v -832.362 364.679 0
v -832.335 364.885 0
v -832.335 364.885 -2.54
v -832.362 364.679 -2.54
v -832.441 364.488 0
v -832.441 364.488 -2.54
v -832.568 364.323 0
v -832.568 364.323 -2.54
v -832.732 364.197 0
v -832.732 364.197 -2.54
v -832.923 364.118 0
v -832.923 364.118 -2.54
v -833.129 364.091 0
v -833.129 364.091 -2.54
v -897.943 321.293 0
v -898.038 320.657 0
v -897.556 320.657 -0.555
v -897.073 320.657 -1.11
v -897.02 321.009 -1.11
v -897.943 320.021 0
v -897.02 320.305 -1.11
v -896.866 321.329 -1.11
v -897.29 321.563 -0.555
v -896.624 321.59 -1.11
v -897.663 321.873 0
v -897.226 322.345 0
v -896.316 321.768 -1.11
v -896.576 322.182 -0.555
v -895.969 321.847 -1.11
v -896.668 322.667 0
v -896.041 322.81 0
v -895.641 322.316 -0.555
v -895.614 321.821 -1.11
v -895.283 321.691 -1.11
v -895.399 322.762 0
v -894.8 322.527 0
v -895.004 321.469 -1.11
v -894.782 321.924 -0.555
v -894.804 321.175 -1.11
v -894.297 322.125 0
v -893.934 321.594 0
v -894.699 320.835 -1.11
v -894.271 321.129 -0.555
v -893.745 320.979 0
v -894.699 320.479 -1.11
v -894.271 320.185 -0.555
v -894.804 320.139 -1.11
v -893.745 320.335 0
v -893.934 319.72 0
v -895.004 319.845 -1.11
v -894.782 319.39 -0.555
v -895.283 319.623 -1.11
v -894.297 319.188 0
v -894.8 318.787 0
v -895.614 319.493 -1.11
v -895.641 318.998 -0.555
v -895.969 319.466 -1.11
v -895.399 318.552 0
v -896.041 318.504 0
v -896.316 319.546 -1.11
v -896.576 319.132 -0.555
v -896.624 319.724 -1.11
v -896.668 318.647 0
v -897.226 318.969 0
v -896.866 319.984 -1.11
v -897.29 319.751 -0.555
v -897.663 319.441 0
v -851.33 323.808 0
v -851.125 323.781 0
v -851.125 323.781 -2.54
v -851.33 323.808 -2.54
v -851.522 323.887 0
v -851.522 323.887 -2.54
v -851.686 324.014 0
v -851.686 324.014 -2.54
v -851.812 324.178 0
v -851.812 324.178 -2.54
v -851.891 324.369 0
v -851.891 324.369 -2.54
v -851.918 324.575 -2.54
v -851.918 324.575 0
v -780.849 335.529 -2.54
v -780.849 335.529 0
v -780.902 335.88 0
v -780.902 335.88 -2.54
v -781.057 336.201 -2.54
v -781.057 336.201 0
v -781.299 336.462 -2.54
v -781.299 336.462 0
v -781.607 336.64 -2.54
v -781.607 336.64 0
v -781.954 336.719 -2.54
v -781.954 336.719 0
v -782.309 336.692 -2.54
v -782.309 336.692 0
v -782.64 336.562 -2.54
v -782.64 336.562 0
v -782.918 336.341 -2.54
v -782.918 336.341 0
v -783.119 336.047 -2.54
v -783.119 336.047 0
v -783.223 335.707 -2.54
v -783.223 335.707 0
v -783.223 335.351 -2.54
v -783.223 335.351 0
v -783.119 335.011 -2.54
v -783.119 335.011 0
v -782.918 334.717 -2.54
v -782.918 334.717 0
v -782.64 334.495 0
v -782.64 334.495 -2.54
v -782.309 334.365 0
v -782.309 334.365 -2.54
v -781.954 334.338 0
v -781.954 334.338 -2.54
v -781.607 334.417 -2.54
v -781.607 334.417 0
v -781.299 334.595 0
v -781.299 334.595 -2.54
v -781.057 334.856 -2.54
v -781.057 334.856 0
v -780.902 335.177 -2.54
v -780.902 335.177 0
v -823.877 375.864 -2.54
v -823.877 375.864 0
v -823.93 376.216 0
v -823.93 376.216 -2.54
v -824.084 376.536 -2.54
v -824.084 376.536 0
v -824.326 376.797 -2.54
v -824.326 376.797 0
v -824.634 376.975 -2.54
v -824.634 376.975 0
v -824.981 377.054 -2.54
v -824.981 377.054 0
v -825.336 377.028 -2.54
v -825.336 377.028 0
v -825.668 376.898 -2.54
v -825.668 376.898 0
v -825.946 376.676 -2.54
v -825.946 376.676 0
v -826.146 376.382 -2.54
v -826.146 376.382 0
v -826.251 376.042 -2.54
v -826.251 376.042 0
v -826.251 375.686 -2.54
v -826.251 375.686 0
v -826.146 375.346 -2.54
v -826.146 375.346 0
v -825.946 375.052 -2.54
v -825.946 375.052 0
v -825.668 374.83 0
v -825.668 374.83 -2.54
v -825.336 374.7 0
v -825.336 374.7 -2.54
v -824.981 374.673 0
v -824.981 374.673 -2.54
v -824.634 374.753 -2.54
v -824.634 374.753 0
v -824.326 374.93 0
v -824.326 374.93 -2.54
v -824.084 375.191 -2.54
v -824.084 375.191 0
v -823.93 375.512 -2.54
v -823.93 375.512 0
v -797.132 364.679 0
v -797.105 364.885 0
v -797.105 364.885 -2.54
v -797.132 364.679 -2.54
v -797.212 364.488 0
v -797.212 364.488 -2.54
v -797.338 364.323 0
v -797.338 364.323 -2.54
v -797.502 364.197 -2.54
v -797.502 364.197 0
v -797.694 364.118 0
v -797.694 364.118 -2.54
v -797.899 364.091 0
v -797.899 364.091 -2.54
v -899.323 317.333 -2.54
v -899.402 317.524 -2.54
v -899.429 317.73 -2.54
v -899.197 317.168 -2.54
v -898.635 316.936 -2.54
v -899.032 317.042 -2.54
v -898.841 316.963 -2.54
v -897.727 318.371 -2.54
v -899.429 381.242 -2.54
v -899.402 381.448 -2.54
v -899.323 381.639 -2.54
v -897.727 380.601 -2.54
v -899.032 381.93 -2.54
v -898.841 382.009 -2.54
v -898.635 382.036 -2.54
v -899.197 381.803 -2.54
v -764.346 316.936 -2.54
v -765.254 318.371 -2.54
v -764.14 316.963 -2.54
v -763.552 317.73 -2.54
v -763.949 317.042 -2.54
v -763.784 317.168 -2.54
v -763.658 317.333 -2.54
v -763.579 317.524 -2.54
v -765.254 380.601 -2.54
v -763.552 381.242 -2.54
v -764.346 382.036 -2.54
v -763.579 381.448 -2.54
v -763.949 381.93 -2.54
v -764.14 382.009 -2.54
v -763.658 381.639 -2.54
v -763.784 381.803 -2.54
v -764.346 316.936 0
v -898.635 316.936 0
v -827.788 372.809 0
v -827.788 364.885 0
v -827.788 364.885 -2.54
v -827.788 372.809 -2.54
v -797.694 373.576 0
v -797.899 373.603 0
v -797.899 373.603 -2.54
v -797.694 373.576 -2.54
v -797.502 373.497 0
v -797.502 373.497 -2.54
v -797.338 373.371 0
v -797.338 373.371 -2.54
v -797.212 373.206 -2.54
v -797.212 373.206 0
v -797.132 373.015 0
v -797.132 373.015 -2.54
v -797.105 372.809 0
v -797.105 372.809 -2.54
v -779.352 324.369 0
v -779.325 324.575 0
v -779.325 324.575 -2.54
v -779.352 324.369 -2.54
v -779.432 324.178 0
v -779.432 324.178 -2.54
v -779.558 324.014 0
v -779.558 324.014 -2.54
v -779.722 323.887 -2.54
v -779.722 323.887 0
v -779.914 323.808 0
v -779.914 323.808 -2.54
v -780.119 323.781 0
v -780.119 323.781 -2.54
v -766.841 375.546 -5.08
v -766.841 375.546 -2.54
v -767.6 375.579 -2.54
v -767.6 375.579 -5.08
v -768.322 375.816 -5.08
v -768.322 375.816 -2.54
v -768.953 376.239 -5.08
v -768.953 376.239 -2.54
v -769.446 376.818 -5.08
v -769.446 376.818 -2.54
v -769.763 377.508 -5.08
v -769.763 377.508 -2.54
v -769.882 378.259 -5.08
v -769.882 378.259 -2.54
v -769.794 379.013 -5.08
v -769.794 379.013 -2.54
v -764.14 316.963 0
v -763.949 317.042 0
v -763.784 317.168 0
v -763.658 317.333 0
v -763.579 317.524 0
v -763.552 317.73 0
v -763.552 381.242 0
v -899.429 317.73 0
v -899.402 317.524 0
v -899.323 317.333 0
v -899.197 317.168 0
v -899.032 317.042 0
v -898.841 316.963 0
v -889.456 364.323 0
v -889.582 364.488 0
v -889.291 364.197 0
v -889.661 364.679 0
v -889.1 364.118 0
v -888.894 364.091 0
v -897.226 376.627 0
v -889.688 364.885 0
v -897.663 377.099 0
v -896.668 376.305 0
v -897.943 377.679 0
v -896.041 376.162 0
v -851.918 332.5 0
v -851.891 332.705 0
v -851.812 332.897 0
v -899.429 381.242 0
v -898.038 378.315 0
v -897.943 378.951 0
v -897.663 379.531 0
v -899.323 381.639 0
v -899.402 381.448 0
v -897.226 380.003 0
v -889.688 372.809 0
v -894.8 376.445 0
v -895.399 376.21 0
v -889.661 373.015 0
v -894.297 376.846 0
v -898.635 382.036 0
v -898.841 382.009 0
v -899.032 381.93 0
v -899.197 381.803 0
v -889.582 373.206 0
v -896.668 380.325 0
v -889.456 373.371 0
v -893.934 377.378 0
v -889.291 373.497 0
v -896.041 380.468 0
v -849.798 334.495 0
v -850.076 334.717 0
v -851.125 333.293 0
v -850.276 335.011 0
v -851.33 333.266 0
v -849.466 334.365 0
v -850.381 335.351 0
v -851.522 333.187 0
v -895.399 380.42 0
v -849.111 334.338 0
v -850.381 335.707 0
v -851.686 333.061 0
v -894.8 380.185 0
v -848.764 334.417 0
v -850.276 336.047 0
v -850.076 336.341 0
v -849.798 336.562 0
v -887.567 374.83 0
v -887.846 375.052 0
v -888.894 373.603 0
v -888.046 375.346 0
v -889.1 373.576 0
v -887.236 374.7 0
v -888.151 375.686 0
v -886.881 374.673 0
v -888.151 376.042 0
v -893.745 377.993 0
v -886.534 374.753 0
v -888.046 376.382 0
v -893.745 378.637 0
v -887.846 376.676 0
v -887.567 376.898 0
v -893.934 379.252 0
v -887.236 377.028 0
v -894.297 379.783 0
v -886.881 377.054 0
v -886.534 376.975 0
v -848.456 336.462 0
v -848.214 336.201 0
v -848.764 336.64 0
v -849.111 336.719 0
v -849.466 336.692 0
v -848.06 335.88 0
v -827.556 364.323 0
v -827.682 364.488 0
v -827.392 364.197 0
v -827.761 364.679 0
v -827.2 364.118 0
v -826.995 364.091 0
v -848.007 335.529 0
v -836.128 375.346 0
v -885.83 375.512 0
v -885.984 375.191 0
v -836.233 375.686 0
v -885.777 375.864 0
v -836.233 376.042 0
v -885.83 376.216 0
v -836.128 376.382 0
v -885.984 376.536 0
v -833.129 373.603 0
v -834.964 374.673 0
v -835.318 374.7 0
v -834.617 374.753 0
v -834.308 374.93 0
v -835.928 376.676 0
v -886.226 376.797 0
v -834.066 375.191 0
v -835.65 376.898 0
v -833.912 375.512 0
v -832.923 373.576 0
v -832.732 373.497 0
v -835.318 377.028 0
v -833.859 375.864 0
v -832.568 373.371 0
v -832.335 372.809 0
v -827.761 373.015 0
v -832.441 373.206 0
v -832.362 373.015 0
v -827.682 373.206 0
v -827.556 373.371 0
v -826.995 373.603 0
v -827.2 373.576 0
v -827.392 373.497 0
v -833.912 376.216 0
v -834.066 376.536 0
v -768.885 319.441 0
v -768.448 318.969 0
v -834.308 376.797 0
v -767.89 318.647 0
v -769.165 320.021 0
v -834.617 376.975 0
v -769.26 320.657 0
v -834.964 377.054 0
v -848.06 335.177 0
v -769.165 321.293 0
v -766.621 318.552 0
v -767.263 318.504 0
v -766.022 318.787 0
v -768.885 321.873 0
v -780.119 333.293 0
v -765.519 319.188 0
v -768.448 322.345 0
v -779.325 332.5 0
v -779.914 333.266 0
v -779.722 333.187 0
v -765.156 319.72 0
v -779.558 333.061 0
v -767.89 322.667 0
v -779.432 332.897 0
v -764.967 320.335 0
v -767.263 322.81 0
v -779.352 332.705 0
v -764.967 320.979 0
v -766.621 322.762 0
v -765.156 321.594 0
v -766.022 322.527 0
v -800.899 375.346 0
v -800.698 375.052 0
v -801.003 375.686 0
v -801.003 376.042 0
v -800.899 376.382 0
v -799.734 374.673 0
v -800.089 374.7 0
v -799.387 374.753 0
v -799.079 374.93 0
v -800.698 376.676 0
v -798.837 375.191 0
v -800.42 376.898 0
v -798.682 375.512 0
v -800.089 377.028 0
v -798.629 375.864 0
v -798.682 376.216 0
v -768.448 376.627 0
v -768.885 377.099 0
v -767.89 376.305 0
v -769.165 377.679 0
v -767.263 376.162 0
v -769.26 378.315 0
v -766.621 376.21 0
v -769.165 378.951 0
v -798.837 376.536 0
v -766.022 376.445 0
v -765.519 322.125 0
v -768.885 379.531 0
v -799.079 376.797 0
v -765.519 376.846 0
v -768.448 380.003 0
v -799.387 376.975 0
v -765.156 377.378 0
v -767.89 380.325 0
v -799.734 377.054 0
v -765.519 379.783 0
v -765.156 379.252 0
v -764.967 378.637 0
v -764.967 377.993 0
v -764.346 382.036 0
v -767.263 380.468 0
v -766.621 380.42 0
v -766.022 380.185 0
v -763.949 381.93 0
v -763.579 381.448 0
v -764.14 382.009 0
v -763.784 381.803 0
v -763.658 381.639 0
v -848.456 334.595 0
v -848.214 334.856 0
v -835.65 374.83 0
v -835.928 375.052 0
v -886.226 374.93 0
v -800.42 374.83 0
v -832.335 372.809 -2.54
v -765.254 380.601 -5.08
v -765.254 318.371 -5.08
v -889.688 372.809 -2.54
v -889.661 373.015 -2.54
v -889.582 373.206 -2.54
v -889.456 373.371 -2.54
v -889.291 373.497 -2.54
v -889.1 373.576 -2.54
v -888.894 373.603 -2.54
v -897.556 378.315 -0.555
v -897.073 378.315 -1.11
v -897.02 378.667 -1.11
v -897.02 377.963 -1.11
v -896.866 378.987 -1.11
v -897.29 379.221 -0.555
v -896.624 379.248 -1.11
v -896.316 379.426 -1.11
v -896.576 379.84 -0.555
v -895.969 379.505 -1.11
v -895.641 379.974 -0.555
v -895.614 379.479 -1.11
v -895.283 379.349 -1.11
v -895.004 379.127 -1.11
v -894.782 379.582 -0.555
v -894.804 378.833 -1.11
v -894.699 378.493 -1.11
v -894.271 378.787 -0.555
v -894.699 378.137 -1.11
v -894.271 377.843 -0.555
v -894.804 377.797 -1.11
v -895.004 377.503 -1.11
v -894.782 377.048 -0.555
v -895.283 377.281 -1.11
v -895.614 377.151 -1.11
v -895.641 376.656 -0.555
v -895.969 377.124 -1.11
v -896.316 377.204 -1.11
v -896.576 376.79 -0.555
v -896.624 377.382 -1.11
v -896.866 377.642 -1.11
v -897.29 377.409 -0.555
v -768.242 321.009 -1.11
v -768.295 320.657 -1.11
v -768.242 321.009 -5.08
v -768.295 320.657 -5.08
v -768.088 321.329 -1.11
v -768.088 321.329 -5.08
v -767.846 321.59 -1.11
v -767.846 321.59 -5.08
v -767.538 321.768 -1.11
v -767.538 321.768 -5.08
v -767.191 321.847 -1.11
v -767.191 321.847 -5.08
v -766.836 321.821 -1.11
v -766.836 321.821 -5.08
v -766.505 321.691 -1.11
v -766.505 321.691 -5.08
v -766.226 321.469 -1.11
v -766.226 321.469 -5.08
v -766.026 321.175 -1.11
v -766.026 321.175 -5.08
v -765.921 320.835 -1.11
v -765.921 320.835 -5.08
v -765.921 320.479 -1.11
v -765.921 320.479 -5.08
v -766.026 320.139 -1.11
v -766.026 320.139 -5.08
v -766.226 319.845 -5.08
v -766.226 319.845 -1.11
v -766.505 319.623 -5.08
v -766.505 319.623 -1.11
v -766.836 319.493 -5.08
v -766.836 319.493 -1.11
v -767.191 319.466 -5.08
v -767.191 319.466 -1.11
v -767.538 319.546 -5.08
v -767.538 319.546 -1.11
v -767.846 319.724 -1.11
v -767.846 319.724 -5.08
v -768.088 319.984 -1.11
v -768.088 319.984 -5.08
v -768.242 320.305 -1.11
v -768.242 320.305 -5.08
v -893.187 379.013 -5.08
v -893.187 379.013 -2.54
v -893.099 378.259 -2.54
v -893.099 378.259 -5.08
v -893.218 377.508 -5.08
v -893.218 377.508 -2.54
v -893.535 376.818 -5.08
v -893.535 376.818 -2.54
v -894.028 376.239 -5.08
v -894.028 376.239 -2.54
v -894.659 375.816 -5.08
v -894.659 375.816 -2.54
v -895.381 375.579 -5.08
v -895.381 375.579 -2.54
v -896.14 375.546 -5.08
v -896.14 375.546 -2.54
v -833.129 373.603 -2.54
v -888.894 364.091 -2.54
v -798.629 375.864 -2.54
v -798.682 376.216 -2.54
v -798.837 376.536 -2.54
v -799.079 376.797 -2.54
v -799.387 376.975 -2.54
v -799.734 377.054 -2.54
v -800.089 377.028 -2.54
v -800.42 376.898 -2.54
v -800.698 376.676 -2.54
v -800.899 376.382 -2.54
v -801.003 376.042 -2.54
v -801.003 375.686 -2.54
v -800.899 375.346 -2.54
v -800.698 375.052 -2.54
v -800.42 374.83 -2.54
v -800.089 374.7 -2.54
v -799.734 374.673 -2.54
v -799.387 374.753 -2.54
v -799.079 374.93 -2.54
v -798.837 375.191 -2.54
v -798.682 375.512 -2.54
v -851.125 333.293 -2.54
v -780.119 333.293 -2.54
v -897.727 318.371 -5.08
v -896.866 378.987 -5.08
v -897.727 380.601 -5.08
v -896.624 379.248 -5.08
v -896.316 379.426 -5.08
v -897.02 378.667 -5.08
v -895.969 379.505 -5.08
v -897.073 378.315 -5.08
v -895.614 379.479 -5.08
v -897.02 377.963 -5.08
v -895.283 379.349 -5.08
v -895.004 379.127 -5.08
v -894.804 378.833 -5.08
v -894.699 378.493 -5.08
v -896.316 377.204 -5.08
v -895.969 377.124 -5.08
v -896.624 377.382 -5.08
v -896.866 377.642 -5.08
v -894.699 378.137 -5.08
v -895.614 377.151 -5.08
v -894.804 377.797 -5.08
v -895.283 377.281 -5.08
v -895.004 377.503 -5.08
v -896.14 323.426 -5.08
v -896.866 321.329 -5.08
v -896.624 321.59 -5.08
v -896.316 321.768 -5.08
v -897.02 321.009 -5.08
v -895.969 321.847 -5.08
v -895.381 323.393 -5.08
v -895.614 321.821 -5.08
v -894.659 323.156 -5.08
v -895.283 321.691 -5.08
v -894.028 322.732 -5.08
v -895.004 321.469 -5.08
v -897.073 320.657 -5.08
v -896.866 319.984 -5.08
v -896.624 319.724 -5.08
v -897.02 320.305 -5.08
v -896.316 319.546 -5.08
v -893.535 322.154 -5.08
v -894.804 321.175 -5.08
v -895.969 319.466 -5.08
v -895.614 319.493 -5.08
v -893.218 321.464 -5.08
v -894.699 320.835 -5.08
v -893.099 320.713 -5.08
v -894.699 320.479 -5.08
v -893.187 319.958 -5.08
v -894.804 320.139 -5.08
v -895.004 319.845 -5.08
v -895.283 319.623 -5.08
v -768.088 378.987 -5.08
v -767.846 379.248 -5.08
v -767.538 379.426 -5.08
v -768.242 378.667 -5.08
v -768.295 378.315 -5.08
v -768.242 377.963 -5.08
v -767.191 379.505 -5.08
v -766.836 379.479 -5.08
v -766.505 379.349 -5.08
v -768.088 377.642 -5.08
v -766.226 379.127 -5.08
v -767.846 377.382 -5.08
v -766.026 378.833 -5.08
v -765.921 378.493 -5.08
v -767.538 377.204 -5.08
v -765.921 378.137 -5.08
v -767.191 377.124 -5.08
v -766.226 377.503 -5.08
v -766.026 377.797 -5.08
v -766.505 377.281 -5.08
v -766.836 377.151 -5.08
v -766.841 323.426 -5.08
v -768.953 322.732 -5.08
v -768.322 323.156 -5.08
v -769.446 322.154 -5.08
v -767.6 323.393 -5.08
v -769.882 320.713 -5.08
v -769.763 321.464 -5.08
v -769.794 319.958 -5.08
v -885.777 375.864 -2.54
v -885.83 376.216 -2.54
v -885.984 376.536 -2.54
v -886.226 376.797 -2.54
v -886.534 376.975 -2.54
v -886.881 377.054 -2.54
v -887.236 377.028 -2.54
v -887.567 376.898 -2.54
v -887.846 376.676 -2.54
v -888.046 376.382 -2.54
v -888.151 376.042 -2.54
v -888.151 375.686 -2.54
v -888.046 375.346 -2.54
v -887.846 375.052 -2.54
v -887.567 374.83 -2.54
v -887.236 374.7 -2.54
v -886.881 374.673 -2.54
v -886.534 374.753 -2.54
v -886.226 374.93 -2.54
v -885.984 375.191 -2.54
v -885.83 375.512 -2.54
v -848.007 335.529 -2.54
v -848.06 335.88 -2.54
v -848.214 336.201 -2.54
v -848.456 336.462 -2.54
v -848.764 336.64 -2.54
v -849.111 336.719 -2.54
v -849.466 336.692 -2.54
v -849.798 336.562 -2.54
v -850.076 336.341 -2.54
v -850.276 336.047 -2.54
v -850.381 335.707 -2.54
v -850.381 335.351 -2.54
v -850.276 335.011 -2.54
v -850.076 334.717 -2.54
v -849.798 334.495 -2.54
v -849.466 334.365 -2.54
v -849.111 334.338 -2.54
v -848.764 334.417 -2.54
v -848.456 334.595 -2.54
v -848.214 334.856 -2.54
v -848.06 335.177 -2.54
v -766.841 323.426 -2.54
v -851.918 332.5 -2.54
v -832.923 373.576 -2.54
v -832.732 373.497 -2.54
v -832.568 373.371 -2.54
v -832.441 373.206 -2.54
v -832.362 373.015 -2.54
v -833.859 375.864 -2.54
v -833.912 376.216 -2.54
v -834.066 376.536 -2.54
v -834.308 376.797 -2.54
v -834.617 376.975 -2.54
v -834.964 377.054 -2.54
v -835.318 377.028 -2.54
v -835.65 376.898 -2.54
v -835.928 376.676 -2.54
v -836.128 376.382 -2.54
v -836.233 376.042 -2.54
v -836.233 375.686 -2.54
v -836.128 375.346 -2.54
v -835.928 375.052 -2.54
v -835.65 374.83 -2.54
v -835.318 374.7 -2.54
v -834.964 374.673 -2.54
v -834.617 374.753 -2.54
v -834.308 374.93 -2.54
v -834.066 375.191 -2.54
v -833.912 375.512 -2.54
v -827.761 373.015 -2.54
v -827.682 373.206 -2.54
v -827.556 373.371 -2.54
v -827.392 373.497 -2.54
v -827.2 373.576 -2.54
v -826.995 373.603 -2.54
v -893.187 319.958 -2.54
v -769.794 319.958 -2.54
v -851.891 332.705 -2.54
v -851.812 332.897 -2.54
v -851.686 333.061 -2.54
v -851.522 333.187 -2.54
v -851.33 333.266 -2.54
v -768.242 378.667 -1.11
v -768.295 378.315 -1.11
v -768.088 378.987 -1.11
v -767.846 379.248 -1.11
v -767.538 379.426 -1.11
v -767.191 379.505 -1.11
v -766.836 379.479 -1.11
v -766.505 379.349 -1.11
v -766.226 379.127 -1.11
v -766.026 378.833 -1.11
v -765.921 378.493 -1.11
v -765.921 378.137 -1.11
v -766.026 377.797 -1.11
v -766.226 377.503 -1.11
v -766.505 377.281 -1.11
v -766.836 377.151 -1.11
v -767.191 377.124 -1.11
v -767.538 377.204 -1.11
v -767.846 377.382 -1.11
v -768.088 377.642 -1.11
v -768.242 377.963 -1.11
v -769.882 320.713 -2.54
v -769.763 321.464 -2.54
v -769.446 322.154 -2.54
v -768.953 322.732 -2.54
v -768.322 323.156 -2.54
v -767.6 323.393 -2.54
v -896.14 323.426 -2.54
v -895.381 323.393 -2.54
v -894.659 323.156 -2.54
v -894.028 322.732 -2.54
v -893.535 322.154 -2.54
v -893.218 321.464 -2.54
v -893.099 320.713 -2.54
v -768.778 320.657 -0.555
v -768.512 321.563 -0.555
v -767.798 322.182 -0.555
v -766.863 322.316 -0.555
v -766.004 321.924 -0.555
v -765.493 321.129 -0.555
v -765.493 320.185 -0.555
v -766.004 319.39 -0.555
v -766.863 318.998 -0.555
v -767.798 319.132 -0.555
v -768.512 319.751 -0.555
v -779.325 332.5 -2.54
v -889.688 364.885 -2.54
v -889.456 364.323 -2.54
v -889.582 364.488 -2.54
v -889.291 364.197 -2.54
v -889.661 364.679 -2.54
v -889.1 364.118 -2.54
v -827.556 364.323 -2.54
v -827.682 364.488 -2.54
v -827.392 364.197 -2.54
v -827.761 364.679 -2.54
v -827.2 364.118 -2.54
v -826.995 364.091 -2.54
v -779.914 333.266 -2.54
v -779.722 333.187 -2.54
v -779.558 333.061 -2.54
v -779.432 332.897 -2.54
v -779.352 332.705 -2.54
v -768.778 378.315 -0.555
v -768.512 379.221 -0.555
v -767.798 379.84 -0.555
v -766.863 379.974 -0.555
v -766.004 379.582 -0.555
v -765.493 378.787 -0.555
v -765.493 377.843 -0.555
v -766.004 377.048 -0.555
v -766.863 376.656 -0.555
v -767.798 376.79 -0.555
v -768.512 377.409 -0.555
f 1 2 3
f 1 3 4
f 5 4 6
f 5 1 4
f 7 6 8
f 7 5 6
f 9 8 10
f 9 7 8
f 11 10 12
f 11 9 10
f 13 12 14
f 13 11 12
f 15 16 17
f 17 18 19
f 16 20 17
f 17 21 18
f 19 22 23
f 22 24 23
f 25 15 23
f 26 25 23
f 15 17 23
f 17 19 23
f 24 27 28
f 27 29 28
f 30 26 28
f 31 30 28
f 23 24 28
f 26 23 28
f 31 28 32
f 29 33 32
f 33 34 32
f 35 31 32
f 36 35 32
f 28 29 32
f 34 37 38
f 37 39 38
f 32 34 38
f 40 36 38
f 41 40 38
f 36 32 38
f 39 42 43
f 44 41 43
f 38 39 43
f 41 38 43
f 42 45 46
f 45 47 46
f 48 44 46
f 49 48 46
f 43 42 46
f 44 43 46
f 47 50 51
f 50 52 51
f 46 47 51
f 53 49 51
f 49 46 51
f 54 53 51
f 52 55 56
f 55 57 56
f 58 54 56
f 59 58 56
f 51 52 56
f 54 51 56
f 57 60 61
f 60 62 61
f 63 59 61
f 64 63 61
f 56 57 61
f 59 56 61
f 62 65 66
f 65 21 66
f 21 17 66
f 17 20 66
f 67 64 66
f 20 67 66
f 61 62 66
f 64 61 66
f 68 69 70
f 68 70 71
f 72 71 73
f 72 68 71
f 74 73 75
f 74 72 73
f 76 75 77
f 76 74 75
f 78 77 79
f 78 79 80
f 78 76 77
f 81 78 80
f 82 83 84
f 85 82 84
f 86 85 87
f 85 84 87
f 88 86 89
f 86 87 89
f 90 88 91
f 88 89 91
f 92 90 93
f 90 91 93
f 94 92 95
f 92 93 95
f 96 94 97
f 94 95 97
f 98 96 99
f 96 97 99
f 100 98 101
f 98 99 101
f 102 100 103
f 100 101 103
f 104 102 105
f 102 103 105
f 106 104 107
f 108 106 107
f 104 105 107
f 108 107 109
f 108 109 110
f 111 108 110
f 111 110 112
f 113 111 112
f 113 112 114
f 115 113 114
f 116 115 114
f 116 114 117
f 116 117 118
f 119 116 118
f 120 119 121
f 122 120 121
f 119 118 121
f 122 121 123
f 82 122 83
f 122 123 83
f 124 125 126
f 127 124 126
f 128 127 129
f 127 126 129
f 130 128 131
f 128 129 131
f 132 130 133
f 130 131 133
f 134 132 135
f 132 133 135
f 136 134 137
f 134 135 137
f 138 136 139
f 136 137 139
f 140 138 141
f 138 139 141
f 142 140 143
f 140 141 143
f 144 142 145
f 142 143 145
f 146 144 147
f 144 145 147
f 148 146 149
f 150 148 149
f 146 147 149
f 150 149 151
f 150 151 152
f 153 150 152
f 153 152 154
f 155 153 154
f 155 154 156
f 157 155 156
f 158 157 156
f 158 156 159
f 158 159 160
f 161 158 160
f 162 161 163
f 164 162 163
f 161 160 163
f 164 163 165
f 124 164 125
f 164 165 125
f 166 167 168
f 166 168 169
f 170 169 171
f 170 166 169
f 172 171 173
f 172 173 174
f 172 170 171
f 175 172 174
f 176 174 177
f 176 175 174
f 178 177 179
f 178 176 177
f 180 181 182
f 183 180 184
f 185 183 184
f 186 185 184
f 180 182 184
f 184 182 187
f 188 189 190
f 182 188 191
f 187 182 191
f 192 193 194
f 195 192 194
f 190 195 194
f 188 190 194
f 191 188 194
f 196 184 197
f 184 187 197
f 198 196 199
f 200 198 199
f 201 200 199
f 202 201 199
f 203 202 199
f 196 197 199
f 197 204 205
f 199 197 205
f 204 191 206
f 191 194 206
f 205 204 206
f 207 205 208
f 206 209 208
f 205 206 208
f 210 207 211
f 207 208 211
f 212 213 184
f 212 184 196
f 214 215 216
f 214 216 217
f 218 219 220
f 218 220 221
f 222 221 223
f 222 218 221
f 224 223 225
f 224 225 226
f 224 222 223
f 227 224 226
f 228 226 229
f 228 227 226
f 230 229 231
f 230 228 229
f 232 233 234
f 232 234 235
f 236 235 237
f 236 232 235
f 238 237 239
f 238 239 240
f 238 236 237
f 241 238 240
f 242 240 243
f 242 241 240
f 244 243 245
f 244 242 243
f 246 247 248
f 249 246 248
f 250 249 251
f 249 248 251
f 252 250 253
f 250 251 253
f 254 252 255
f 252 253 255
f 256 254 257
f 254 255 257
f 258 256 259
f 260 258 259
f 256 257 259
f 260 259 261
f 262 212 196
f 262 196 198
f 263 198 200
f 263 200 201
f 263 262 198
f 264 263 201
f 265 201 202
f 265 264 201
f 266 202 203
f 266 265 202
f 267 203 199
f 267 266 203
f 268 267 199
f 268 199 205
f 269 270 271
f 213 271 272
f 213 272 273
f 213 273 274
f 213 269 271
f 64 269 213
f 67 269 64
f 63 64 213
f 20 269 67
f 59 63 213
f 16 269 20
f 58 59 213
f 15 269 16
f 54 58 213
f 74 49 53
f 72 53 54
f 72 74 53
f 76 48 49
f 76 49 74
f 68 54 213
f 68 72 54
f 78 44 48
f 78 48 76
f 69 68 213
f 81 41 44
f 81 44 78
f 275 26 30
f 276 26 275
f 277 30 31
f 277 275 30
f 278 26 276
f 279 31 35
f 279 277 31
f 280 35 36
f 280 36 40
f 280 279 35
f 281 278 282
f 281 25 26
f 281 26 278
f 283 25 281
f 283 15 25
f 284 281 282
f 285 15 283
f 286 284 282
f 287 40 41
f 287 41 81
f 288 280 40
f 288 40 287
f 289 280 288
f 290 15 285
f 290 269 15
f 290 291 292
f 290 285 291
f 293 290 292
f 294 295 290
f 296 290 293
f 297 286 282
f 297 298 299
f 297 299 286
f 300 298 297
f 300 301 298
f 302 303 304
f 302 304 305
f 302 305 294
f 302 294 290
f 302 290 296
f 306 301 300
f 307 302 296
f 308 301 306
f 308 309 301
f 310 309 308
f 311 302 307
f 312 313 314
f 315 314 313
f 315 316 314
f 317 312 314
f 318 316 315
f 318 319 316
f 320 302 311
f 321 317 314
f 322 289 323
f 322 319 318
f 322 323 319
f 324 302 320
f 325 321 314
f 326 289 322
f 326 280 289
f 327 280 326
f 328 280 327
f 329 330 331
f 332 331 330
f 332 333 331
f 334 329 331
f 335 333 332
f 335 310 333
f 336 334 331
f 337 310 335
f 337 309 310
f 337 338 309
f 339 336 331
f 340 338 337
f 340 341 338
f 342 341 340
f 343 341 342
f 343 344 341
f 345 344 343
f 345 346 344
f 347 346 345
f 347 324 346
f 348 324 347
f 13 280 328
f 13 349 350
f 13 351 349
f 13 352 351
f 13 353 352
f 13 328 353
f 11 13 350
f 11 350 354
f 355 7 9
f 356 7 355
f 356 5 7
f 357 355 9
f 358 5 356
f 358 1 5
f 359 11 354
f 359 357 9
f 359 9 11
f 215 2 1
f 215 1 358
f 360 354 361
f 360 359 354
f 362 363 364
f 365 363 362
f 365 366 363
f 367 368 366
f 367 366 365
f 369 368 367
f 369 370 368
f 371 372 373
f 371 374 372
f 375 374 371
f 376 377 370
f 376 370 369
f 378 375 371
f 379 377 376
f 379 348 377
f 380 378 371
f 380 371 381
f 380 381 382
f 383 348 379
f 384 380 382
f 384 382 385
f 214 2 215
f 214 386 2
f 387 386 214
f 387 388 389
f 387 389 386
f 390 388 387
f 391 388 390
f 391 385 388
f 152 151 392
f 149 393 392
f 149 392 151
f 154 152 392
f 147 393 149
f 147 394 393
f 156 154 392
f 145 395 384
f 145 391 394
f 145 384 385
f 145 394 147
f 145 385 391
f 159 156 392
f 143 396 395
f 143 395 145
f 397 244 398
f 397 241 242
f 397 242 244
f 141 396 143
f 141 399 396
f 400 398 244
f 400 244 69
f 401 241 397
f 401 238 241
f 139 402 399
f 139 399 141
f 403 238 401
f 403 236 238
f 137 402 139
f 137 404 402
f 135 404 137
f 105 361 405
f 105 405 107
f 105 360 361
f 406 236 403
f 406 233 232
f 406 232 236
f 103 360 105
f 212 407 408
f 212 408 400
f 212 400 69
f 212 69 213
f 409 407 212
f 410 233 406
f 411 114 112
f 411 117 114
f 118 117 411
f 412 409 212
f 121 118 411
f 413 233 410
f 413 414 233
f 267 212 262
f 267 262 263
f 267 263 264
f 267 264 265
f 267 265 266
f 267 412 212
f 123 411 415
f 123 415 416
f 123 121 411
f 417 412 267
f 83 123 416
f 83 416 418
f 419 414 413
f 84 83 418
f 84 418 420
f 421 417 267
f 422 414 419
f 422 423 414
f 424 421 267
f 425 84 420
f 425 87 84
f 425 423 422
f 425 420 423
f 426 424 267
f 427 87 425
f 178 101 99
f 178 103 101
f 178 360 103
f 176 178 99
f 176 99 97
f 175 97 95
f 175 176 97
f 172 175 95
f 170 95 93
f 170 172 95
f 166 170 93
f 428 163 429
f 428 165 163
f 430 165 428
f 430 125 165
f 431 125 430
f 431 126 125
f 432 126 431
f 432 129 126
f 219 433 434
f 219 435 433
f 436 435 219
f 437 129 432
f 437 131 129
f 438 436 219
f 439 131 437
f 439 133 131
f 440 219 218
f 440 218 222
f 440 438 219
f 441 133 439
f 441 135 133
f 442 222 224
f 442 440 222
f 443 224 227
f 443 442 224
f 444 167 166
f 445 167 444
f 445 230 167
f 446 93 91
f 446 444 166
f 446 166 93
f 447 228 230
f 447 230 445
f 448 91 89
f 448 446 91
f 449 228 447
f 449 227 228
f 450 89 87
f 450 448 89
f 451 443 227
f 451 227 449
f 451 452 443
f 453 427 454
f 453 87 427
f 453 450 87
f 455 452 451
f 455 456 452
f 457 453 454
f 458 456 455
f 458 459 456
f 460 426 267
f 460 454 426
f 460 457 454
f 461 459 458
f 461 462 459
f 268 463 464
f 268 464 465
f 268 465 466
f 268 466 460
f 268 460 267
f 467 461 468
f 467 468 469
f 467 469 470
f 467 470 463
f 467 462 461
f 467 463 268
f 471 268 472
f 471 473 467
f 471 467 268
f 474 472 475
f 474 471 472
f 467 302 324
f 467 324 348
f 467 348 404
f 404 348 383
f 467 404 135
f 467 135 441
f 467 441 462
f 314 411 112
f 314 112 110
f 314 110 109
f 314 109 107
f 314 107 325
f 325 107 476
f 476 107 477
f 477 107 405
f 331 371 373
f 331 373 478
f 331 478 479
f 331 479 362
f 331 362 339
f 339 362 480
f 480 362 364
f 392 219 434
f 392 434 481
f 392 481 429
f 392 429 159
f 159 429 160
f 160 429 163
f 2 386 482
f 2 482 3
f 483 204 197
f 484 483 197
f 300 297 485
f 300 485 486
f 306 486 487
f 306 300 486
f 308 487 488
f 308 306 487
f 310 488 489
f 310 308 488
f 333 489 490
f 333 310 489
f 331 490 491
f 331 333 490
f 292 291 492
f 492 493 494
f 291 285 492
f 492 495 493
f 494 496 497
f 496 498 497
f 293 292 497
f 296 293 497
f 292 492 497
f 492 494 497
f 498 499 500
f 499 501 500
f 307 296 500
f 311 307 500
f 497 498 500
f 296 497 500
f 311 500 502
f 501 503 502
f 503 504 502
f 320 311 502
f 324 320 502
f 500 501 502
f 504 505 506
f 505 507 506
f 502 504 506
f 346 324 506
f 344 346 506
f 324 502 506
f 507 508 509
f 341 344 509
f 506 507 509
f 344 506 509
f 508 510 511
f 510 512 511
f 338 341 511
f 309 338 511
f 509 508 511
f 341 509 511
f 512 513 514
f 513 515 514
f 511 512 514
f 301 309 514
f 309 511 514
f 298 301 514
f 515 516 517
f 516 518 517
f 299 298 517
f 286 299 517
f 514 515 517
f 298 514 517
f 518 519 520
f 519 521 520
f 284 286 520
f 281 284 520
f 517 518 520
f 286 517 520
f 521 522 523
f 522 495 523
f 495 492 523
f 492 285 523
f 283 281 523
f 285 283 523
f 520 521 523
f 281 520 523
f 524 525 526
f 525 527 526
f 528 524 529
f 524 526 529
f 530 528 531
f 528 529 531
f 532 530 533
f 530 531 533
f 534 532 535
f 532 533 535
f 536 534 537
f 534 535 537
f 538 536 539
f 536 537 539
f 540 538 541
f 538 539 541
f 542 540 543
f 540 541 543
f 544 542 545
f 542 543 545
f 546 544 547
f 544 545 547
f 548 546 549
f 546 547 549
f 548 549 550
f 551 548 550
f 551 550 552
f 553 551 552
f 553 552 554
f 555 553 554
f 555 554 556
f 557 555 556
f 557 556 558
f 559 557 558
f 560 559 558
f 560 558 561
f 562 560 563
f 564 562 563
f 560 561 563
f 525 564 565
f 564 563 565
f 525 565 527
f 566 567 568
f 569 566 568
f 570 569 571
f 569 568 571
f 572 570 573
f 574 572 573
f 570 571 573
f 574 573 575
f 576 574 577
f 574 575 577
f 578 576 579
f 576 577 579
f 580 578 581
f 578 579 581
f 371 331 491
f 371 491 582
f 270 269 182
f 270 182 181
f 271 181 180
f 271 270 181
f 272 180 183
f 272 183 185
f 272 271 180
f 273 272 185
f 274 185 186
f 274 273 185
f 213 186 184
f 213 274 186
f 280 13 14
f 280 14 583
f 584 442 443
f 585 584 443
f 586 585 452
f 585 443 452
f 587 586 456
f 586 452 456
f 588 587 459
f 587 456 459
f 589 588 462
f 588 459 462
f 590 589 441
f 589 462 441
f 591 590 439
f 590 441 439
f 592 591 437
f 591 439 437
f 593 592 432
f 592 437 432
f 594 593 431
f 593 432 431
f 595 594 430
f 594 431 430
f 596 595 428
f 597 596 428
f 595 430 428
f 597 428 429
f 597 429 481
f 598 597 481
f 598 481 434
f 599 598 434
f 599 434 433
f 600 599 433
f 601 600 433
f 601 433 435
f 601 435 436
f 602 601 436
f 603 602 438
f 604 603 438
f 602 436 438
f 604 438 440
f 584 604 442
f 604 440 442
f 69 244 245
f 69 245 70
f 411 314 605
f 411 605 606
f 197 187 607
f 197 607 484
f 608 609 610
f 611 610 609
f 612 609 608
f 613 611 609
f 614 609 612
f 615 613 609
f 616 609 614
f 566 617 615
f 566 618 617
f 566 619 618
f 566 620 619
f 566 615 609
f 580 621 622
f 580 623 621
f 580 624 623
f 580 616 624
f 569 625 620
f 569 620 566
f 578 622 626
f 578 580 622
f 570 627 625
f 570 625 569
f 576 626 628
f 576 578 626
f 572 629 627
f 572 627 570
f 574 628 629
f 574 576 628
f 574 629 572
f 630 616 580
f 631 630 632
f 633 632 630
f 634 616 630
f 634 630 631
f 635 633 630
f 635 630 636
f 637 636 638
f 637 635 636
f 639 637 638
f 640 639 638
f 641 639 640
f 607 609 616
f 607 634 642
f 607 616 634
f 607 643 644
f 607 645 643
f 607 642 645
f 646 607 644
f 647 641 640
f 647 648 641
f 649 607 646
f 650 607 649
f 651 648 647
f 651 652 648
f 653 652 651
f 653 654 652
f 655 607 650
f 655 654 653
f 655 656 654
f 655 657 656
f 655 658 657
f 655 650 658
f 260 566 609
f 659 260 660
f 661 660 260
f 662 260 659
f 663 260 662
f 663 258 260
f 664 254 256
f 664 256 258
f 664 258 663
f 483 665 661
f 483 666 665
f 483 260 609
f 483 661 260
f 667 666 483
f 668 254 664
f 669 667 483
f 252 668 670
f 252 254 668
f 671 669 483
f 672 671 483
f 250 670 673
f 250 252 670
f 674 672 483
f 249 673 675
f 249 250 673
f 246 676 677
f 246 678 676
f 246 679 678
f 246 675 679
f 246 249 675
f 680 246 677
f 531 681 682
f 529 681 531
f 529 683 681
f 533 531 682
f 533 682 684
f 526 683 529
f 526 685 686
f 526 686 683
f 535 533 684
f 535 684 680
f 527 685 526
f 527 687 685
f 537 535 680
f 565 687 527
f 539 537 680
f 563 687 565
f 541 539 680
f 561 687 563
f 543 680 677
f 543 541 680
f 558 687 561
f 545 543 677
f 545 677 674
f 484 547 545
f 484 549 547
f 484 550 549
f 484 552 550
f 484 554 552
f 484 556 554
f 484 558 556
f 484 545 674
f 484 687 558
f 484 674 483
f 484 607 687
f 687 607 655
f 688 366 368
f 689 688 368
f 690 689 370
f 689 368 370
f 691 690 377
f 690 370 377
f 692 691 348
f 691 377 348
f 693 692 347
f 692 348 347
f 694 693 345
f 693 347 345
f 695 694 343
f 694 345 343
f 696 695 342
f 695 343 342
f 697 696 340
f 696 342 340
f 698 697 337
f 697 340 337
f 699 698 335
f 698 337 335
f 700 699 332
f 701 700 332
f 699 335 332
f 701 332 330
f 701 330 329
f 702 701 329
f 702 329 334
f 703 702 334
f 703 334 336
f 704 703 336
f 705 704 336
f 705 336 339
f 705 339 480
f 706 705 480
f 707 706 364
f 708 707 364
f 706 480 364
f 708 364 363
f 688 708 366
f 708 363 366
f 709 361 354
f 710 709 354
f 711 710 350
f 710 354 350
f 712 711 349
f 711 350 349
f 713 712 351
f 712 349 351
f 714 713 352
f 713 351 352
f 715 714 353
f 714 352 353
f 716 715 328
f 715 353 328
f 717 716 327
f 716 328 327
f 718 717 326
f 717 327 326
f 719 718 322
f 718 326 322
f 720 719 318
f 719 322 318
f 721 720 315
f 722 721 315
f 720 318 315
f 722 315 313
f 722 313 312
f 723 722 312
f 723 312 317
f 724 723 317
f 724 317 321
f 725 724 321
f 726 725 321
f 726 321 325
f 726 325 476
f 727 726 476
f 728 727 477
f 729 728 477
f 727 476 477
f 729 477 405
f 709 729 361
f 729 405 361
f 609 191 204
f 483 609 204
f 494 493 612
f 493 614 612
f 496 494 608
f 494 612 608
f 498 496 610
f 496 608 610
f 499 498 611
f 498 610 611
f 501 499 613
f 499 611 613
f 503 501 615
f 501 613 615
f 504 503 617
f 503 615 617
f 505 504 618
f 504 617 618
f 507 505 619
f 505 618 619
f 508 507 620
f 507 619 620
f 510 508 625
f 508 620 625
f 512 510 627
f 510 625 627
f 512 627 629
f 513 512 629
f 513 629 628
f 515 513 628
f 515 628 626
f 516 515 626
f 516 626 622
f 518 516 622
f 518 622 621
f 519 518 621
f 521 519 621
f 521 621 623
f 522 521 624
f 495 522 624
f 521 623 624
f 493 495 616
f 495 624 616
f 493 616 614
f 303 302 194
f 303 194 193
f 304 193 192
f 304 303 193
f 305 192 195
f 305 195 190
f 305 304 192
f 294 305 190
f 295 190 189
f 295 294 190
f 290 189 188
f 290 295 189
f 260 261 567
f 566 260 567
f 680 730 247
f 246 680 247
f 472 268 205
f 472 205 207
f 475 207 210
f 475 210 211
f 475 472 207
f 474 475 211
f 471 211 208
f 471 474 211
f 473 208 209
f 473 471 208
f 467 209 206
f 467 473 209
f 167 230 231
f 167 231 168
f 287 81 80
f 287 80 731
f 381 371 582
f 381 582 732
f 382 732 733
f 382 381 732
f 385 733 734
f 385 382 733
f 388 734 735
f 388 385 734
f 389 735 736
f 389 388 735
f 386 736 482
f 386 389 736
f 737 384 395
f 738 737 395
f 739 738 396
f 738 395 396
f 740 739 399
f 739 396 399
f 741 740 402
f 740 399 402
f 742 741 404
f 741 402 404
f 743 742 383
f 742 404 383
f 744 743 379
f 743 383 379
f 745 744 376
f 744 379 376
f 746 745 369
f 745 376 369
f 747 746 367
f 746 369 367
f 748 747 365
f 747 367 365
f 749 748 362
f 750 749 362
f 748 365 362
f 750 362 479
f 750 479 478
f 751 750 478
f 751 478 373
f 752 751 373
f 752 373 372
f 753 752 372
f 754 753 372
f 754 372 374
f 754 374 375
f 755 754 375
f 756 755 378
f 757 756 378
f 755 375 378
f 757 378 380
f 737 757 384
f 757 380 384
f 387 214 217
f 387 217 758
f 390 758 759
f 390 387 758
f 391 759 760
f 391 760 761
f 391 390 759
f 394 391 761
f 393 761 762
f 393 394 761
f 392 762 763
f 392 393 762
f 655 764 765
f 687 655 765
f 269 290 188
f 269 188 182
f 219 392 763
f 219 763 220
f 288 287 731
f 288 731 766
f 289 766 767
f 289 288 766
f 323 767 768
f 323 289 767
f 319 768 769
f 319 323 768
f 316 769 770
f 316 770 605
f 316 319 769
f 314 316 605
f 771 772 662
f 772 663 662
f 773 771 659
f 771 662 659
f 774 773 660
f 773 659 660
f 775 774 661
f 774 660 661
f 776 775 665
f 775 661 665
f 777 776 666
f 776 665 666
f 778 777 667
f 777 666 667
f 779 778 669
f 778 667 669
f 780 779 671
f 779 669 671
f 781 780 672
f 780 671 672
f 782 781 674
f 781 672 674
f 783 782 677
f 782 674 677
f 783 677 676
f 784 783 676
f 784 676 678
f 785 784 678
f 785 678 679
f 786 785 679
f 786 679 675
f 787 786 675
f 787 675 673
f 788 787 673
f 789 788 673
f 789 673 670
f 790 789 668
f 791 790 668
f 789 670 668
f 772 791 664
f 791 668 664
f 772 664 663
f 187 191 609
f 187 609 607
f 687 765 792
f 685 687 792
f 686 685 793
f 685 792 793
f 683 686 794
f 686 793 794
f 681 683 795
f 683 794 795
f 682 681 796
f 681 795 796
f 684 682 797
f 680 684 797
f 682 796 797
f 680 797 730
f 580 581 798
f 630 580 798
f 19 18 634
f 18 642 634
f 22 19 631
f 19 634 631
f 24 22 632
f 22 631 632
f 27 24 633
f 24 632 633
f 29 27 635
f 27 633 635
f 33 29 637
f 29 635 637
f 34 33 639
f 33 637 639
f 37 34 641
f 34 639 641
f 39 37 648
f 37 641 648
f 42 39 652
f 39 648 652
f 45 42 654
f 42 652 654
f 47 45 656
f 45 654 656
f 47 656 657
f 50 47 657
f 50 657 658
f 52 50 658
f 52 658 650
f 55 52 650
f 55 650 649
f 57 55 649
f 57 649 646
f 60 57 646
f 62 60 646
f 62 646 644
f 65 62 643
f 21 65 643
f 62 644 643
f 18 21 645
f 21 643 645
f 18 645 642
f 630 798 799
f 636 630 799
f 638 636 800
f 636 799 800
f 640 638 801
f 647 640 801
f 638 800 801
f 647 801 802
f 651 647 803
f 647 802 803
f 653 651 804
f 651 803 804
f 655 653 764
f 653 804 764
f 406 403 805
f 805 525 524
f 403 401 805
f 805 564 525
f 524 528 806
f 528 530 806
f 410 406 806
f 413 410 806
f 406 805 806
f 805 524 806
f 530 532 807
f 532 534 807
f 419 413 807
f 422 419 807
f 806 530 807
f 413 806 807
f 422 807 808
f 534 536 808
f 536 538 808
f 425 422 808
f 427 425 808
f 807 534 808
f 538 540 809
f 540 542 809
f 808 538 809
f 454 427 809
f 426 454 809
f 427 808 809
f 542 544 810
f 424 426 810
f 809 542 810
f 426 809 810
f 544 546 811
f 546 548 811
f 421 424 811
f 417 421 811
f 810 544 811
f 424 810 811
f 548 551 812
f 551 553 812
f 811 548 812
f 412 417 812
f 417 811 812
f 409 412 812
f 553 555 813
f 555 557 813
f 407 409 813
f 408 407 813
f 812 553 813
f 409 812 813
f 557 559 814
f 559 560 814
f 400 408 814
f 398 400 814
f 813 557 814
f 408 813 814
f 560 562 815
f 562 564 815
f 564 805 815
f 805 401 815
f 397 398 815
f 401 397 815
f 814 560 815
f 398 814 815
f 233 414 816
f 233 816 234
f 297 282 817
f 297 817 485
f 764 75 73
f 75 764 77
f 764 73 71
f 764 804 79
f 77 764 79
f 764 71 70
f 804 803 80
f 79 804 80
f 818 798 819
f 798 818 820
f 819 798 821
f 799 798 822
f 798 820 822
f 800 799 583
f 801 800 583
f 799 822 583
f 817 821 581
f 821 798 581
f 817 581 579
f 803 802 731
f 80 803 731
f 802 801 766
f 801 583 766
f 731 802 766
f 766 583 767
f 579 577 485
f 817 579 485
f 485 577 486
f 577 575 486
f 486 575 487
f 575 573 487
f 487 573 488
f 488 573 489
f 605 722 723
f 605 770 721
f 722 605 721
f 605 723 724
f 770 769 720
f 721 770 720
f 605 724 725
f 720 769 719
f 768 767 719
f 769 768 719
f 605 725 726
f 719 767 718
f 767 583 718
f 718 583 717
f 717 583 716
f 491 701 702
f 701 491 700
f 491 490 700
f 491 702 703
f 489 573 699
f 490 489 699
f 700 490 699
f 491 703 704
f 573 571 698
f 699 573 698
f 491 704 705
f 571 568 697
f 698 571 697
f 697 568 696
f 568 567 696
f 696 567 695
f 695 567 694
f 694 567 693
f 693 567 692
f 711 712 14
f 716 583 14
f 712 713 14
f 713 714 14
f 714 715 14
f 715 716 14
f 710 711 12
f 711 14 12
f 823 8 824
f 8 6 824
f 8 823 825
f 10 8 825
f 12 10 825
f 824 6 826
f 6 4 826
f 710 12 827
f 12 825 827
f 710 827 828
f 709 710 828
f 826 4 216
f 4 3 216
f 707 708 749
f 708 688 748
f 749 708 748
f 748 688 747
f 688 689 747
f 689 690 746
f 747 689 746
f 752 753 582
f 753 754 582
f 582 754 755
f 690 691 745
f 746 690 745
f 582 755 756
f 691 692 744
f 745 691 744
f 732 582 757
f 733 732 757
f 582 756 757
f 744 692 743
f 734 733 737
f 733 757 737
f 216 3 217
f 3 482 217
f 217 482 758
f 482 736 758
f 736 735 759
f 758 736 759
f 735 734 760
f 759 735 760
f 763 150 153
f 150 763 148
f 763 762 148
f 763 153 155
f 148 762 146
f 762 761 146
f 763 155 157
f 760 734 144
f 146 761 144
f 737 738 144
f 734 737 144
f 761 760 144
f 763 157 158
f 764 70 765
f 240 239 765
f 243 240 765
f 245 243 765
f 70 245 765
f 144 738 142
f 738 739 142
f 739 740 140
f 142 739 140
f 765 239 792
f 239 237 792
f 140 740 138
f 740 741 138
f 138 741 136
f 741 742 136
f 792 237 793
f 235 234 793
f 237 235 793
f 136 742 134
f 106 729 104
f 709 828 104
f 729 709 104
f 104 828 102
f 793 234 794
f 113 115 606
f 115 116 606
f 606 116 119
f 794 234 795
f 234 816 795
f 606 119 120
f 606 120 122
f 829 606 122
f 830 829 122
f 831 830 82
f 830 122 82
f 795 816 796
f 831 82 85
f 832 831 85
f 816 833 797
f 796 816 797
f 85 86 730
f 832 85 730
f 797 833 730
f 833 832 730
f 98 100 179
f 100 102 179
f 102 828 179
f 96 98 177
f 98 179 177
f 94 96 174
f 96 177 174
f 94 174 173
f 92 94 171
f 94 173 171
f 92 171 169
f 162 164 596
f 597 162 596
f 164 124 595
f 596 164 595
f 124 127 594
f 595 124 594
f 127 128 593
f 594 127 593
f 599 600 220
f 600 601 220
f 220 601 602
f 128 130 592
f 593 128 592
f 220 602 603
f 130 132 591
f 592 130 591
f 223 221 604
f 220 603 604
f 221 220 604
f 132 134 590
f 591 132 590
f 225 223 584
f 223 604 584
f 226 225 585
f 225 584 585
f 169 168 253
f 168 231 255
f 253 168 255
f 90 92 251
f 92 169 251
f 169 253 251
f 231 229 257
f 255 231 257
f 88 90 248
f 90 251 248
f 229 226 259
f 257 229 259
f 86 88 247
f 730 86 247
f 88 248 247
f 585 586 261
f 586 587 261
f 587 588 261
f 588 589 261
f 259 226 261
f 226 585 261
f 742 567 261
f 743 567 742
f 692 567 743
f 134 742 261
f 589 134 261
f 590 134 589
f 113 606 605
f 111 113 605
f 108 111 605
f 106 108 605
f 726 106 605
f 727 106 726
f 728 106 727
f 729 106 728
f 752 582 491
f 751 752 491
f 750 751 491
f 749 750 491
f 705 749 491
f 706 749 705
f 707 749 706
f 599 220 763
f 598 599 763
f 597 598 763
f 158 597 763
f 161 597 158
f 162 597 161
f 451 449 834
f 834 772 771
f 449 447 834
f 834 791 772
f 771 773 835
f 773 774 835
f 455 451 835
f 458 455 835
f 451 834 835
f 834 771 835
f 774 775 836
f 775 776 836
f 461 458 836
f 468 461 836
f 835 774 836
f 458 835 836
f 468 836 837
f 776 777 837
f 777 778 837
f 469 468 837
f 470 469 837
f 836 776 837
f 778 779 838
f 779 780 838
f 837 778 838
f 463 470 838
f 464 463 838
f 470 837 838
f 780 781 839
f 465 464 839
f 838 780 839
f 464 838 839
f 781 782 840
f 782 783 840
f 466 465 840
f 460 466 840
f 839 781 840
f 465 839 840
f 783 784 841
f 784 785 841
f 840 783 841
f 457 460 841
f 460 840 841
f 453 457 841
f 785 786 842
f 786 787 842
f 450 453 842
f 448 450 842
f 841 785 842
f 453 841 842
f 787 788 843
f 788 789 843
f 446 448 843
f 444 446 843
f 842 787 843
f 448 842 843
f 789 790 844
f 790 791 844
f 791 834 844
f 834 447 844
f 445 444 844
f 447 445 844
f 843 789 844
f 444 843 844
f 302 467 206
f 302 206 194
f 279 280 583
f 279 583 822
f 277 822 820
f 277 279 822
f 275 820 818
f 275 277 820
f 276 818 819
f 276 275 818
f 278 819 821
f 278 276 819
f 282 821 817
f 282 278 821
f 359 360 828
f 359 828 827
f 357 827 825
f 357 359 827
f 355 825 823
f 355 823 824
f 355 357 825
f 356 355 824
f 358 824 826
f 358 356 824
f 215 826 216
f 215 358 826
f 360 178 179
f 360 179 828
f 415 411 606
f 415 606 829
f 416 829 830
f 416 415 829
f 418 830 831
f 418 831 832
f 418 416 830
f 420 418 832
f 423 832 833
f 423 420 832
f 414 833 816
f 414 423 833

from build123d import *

# Parameters (mm, degrees)
F0_R           = 1.1938
F1_DEPTH       = 2.54
F2_W           = 132.4737
F2_H           = 62.23
F3_DEPTH       = 2.54
F4_D           = 2.3876
F4_CSINK_D     = 4.318
F4_CSINK_ANGLE = 82


with BuildPart() as f1:
    # F0 (on Top) → F1 (new body)
    with BuildSketch(Plane.XY):
        with BuildLine():
            ThreePointArc((-763.551821, 381.242233), (-763.784305, 381.803499), (-764.345571, 382.035983))
            Line((-764.345571, 382.035983), (-898.635371, 382.035983))
            ThreePointArc((-898.635371, 382.035983), (-899.196637, 381.803499), (-899.429121, 381.242233))
            Line((-899.429121, 381.242233), (-899.429121, 317.729533))
            ThreePointArc((-899.429121, 317.729533), (-899.196637, 317.168267), (-898.635371, 316.935783))
            Line((-898.635371, 316.935783), (-764.345571, 316.935783))
            ThreePointArc((-764.345571, 316.935783), (-763.784305, 317.168267), (-763.551821, 317.729533))
            Line((-763.551821, 317.729533), (-763.551821, 381.242233))
        make_face()
        with Locations((-849.200621, 335.528583)):
            Circle(F0_R, mode=Mode.SUBTRACT)
        with BuildLine():
            ThreePointArc((-780.118971, 333.293383), (-779.557705, 333.060899), (-779.325221, 332.499633))
            Line((-779.325221, 332.499633), (-779.325221, 324.574833))
            ThreePointArc((-779.325221, 324.574833), (-779.557705, 324.013567), (-780.118971, 323.781083))
            Line((-780.118971, 323.781083), (-851.124671, 323.781083))
            ThreePointArc((-851.124671, 323.781083), (-851.685937, 324.013567), (-851.918421, 324.574833))
            Line((-851.918421, 324.574833), (-851.918421, 332.499633))
            ThreePointArc((-851.918421, 332.499633), (-851.685937, 333.060899), (-851.124671, 333.293383))
            Line((-851.124671, 333.293383), (-780.118971, 333.293383))
        make_face(mode=Mode.SUBTRACT)
        with Locations((-782.043021, 335.528583)):
            Circle(F0_R, mode=Mode.SUBTRACT)
        with Locations((-886.970421, 375.863783)):
            Circle(F0_R, mode=Mode.SUBTRACT)
        with BuildLine():
            Line((-888.894471, 373.603183), (-833.128771, 373.603183))
            ThreePointArc((-833.128771, 373.603183), (-832.567505, 373.370699), (-832.335021, 372.809433))
            Line((-832.335021, 372.809433), (-832.335021, 364.884633))
            ThreePointArc((-832.335021, 364.884633), (-832.567505, 364.323367), (-833.128771, 364.090883))
            Line((-833.128771, 364.090883), (-888.894471, 364.090883))
            ThreePointArc((-888.894471, 364.090883), (-889.455737, 364.323367), (-889.688221, 364.884633))
            Line((-889.688221, 364.884633), (-889.688221, 372.809433))
            ThreePointArc((-889.688221, 372.809433), (-889.455737, 373.370699), (-888.894471, 373.603183))
        make_face(mode=Mode.SUBTRACT)
        with Locations((-835.052821, 375.863783)):
            Circle(F0_R, mode=Mode.SUBTRACT)
        with BuildLine():
            Line((-826.994671, 373.603183), (-797.898971, 373.603183))
            ThreePointArc((-797.898971, 373.603183), (-797.337705, 373.370699), (-797.105221, 372.809433))
            Line((-797.105221, 372.809433), (-797.105221, 364.884633))
            ThreePointArc((-797.105221, 364.884633), (-797.337705, 364.323367), (-797.898971, 364.090883))
            Line((-797.898971, 364.090883), (-826.994671, 364.090883))
            ThreePointArc((-826.994671, 364.090883), (-827.555937, 364.323367), (-827.788421, 364.884633))
            Line((-827.788421, 364.884633), (-827.788421, 372.809433))
            ThreePointArc((-827.788421, 372.809433), (-827.555937, 373.370699), (-826.994671, 373.603183))
        make_face(mode=Mode.SUBTRACT)
        with Locations((-825.070621, 375.863783)):
            Circle(F0_R, mode=Mode.SUBTRACT)
        with Locations((-799.823021, 375.863783)):
            Circle(F0_R, mode=Mode.SUBTRACT)
    extrude(amount=-F1_DEPTH)

    # F2 (on face) → F3 (join)
    with BuildSketch(Plane(origin=(0, 0, -2.54), x_dir=(1, 0, 0), z_dir=(0, 0, -1))):
        with Locations((-831.490471, -349.485883)):
            Rectangle(F2_W, F2_H)
        with BuildLine():
            ThreePointArc((-769.793631, -319.958383), (-769.219127, -322.459981), (-766.841121, -323.425971))
            Line((-766.841121, -323.425971), (-766.841121, -375.545795))
            ThreePointArc((-766.841121, -375.545795), (-769.219127, -376.511785), (-769.793631, -379.013383))
            Line((-769.793631, -379.013383), (-893.187311, -379.013383))
            ThreePointArc((-893.187311, -379.013383), (-893.761815, -376.511785), (-896.139821, -375.545795))
            Line((-896.139821, -375.545795), (-896.139821, -323.425971))
            ThreePointArc((-896.139821, -323.425971), (-893.761815, -322.459981), (-893.187311, -319.958383))
            Line((-893.187311, -319.958383), (-769.793631, -319.958383))
        make_face(mode=Mode.SUBTRACT)
    extrude(amount=F3_DEPTH)

    # F4 (through all)
    with Locations(Plane.XY):
        with Locations((-895.879471, 378.314883), (-767.101471, 378.314883), (-767.101471, 320.656883), (-895.879471, 320.656883)):
            CounterSinkHole(F4_D / 2, F4_CSINK_D / 2, counter_sink_angle=F4_CSINK_ANGLE)


solid = f1.part
